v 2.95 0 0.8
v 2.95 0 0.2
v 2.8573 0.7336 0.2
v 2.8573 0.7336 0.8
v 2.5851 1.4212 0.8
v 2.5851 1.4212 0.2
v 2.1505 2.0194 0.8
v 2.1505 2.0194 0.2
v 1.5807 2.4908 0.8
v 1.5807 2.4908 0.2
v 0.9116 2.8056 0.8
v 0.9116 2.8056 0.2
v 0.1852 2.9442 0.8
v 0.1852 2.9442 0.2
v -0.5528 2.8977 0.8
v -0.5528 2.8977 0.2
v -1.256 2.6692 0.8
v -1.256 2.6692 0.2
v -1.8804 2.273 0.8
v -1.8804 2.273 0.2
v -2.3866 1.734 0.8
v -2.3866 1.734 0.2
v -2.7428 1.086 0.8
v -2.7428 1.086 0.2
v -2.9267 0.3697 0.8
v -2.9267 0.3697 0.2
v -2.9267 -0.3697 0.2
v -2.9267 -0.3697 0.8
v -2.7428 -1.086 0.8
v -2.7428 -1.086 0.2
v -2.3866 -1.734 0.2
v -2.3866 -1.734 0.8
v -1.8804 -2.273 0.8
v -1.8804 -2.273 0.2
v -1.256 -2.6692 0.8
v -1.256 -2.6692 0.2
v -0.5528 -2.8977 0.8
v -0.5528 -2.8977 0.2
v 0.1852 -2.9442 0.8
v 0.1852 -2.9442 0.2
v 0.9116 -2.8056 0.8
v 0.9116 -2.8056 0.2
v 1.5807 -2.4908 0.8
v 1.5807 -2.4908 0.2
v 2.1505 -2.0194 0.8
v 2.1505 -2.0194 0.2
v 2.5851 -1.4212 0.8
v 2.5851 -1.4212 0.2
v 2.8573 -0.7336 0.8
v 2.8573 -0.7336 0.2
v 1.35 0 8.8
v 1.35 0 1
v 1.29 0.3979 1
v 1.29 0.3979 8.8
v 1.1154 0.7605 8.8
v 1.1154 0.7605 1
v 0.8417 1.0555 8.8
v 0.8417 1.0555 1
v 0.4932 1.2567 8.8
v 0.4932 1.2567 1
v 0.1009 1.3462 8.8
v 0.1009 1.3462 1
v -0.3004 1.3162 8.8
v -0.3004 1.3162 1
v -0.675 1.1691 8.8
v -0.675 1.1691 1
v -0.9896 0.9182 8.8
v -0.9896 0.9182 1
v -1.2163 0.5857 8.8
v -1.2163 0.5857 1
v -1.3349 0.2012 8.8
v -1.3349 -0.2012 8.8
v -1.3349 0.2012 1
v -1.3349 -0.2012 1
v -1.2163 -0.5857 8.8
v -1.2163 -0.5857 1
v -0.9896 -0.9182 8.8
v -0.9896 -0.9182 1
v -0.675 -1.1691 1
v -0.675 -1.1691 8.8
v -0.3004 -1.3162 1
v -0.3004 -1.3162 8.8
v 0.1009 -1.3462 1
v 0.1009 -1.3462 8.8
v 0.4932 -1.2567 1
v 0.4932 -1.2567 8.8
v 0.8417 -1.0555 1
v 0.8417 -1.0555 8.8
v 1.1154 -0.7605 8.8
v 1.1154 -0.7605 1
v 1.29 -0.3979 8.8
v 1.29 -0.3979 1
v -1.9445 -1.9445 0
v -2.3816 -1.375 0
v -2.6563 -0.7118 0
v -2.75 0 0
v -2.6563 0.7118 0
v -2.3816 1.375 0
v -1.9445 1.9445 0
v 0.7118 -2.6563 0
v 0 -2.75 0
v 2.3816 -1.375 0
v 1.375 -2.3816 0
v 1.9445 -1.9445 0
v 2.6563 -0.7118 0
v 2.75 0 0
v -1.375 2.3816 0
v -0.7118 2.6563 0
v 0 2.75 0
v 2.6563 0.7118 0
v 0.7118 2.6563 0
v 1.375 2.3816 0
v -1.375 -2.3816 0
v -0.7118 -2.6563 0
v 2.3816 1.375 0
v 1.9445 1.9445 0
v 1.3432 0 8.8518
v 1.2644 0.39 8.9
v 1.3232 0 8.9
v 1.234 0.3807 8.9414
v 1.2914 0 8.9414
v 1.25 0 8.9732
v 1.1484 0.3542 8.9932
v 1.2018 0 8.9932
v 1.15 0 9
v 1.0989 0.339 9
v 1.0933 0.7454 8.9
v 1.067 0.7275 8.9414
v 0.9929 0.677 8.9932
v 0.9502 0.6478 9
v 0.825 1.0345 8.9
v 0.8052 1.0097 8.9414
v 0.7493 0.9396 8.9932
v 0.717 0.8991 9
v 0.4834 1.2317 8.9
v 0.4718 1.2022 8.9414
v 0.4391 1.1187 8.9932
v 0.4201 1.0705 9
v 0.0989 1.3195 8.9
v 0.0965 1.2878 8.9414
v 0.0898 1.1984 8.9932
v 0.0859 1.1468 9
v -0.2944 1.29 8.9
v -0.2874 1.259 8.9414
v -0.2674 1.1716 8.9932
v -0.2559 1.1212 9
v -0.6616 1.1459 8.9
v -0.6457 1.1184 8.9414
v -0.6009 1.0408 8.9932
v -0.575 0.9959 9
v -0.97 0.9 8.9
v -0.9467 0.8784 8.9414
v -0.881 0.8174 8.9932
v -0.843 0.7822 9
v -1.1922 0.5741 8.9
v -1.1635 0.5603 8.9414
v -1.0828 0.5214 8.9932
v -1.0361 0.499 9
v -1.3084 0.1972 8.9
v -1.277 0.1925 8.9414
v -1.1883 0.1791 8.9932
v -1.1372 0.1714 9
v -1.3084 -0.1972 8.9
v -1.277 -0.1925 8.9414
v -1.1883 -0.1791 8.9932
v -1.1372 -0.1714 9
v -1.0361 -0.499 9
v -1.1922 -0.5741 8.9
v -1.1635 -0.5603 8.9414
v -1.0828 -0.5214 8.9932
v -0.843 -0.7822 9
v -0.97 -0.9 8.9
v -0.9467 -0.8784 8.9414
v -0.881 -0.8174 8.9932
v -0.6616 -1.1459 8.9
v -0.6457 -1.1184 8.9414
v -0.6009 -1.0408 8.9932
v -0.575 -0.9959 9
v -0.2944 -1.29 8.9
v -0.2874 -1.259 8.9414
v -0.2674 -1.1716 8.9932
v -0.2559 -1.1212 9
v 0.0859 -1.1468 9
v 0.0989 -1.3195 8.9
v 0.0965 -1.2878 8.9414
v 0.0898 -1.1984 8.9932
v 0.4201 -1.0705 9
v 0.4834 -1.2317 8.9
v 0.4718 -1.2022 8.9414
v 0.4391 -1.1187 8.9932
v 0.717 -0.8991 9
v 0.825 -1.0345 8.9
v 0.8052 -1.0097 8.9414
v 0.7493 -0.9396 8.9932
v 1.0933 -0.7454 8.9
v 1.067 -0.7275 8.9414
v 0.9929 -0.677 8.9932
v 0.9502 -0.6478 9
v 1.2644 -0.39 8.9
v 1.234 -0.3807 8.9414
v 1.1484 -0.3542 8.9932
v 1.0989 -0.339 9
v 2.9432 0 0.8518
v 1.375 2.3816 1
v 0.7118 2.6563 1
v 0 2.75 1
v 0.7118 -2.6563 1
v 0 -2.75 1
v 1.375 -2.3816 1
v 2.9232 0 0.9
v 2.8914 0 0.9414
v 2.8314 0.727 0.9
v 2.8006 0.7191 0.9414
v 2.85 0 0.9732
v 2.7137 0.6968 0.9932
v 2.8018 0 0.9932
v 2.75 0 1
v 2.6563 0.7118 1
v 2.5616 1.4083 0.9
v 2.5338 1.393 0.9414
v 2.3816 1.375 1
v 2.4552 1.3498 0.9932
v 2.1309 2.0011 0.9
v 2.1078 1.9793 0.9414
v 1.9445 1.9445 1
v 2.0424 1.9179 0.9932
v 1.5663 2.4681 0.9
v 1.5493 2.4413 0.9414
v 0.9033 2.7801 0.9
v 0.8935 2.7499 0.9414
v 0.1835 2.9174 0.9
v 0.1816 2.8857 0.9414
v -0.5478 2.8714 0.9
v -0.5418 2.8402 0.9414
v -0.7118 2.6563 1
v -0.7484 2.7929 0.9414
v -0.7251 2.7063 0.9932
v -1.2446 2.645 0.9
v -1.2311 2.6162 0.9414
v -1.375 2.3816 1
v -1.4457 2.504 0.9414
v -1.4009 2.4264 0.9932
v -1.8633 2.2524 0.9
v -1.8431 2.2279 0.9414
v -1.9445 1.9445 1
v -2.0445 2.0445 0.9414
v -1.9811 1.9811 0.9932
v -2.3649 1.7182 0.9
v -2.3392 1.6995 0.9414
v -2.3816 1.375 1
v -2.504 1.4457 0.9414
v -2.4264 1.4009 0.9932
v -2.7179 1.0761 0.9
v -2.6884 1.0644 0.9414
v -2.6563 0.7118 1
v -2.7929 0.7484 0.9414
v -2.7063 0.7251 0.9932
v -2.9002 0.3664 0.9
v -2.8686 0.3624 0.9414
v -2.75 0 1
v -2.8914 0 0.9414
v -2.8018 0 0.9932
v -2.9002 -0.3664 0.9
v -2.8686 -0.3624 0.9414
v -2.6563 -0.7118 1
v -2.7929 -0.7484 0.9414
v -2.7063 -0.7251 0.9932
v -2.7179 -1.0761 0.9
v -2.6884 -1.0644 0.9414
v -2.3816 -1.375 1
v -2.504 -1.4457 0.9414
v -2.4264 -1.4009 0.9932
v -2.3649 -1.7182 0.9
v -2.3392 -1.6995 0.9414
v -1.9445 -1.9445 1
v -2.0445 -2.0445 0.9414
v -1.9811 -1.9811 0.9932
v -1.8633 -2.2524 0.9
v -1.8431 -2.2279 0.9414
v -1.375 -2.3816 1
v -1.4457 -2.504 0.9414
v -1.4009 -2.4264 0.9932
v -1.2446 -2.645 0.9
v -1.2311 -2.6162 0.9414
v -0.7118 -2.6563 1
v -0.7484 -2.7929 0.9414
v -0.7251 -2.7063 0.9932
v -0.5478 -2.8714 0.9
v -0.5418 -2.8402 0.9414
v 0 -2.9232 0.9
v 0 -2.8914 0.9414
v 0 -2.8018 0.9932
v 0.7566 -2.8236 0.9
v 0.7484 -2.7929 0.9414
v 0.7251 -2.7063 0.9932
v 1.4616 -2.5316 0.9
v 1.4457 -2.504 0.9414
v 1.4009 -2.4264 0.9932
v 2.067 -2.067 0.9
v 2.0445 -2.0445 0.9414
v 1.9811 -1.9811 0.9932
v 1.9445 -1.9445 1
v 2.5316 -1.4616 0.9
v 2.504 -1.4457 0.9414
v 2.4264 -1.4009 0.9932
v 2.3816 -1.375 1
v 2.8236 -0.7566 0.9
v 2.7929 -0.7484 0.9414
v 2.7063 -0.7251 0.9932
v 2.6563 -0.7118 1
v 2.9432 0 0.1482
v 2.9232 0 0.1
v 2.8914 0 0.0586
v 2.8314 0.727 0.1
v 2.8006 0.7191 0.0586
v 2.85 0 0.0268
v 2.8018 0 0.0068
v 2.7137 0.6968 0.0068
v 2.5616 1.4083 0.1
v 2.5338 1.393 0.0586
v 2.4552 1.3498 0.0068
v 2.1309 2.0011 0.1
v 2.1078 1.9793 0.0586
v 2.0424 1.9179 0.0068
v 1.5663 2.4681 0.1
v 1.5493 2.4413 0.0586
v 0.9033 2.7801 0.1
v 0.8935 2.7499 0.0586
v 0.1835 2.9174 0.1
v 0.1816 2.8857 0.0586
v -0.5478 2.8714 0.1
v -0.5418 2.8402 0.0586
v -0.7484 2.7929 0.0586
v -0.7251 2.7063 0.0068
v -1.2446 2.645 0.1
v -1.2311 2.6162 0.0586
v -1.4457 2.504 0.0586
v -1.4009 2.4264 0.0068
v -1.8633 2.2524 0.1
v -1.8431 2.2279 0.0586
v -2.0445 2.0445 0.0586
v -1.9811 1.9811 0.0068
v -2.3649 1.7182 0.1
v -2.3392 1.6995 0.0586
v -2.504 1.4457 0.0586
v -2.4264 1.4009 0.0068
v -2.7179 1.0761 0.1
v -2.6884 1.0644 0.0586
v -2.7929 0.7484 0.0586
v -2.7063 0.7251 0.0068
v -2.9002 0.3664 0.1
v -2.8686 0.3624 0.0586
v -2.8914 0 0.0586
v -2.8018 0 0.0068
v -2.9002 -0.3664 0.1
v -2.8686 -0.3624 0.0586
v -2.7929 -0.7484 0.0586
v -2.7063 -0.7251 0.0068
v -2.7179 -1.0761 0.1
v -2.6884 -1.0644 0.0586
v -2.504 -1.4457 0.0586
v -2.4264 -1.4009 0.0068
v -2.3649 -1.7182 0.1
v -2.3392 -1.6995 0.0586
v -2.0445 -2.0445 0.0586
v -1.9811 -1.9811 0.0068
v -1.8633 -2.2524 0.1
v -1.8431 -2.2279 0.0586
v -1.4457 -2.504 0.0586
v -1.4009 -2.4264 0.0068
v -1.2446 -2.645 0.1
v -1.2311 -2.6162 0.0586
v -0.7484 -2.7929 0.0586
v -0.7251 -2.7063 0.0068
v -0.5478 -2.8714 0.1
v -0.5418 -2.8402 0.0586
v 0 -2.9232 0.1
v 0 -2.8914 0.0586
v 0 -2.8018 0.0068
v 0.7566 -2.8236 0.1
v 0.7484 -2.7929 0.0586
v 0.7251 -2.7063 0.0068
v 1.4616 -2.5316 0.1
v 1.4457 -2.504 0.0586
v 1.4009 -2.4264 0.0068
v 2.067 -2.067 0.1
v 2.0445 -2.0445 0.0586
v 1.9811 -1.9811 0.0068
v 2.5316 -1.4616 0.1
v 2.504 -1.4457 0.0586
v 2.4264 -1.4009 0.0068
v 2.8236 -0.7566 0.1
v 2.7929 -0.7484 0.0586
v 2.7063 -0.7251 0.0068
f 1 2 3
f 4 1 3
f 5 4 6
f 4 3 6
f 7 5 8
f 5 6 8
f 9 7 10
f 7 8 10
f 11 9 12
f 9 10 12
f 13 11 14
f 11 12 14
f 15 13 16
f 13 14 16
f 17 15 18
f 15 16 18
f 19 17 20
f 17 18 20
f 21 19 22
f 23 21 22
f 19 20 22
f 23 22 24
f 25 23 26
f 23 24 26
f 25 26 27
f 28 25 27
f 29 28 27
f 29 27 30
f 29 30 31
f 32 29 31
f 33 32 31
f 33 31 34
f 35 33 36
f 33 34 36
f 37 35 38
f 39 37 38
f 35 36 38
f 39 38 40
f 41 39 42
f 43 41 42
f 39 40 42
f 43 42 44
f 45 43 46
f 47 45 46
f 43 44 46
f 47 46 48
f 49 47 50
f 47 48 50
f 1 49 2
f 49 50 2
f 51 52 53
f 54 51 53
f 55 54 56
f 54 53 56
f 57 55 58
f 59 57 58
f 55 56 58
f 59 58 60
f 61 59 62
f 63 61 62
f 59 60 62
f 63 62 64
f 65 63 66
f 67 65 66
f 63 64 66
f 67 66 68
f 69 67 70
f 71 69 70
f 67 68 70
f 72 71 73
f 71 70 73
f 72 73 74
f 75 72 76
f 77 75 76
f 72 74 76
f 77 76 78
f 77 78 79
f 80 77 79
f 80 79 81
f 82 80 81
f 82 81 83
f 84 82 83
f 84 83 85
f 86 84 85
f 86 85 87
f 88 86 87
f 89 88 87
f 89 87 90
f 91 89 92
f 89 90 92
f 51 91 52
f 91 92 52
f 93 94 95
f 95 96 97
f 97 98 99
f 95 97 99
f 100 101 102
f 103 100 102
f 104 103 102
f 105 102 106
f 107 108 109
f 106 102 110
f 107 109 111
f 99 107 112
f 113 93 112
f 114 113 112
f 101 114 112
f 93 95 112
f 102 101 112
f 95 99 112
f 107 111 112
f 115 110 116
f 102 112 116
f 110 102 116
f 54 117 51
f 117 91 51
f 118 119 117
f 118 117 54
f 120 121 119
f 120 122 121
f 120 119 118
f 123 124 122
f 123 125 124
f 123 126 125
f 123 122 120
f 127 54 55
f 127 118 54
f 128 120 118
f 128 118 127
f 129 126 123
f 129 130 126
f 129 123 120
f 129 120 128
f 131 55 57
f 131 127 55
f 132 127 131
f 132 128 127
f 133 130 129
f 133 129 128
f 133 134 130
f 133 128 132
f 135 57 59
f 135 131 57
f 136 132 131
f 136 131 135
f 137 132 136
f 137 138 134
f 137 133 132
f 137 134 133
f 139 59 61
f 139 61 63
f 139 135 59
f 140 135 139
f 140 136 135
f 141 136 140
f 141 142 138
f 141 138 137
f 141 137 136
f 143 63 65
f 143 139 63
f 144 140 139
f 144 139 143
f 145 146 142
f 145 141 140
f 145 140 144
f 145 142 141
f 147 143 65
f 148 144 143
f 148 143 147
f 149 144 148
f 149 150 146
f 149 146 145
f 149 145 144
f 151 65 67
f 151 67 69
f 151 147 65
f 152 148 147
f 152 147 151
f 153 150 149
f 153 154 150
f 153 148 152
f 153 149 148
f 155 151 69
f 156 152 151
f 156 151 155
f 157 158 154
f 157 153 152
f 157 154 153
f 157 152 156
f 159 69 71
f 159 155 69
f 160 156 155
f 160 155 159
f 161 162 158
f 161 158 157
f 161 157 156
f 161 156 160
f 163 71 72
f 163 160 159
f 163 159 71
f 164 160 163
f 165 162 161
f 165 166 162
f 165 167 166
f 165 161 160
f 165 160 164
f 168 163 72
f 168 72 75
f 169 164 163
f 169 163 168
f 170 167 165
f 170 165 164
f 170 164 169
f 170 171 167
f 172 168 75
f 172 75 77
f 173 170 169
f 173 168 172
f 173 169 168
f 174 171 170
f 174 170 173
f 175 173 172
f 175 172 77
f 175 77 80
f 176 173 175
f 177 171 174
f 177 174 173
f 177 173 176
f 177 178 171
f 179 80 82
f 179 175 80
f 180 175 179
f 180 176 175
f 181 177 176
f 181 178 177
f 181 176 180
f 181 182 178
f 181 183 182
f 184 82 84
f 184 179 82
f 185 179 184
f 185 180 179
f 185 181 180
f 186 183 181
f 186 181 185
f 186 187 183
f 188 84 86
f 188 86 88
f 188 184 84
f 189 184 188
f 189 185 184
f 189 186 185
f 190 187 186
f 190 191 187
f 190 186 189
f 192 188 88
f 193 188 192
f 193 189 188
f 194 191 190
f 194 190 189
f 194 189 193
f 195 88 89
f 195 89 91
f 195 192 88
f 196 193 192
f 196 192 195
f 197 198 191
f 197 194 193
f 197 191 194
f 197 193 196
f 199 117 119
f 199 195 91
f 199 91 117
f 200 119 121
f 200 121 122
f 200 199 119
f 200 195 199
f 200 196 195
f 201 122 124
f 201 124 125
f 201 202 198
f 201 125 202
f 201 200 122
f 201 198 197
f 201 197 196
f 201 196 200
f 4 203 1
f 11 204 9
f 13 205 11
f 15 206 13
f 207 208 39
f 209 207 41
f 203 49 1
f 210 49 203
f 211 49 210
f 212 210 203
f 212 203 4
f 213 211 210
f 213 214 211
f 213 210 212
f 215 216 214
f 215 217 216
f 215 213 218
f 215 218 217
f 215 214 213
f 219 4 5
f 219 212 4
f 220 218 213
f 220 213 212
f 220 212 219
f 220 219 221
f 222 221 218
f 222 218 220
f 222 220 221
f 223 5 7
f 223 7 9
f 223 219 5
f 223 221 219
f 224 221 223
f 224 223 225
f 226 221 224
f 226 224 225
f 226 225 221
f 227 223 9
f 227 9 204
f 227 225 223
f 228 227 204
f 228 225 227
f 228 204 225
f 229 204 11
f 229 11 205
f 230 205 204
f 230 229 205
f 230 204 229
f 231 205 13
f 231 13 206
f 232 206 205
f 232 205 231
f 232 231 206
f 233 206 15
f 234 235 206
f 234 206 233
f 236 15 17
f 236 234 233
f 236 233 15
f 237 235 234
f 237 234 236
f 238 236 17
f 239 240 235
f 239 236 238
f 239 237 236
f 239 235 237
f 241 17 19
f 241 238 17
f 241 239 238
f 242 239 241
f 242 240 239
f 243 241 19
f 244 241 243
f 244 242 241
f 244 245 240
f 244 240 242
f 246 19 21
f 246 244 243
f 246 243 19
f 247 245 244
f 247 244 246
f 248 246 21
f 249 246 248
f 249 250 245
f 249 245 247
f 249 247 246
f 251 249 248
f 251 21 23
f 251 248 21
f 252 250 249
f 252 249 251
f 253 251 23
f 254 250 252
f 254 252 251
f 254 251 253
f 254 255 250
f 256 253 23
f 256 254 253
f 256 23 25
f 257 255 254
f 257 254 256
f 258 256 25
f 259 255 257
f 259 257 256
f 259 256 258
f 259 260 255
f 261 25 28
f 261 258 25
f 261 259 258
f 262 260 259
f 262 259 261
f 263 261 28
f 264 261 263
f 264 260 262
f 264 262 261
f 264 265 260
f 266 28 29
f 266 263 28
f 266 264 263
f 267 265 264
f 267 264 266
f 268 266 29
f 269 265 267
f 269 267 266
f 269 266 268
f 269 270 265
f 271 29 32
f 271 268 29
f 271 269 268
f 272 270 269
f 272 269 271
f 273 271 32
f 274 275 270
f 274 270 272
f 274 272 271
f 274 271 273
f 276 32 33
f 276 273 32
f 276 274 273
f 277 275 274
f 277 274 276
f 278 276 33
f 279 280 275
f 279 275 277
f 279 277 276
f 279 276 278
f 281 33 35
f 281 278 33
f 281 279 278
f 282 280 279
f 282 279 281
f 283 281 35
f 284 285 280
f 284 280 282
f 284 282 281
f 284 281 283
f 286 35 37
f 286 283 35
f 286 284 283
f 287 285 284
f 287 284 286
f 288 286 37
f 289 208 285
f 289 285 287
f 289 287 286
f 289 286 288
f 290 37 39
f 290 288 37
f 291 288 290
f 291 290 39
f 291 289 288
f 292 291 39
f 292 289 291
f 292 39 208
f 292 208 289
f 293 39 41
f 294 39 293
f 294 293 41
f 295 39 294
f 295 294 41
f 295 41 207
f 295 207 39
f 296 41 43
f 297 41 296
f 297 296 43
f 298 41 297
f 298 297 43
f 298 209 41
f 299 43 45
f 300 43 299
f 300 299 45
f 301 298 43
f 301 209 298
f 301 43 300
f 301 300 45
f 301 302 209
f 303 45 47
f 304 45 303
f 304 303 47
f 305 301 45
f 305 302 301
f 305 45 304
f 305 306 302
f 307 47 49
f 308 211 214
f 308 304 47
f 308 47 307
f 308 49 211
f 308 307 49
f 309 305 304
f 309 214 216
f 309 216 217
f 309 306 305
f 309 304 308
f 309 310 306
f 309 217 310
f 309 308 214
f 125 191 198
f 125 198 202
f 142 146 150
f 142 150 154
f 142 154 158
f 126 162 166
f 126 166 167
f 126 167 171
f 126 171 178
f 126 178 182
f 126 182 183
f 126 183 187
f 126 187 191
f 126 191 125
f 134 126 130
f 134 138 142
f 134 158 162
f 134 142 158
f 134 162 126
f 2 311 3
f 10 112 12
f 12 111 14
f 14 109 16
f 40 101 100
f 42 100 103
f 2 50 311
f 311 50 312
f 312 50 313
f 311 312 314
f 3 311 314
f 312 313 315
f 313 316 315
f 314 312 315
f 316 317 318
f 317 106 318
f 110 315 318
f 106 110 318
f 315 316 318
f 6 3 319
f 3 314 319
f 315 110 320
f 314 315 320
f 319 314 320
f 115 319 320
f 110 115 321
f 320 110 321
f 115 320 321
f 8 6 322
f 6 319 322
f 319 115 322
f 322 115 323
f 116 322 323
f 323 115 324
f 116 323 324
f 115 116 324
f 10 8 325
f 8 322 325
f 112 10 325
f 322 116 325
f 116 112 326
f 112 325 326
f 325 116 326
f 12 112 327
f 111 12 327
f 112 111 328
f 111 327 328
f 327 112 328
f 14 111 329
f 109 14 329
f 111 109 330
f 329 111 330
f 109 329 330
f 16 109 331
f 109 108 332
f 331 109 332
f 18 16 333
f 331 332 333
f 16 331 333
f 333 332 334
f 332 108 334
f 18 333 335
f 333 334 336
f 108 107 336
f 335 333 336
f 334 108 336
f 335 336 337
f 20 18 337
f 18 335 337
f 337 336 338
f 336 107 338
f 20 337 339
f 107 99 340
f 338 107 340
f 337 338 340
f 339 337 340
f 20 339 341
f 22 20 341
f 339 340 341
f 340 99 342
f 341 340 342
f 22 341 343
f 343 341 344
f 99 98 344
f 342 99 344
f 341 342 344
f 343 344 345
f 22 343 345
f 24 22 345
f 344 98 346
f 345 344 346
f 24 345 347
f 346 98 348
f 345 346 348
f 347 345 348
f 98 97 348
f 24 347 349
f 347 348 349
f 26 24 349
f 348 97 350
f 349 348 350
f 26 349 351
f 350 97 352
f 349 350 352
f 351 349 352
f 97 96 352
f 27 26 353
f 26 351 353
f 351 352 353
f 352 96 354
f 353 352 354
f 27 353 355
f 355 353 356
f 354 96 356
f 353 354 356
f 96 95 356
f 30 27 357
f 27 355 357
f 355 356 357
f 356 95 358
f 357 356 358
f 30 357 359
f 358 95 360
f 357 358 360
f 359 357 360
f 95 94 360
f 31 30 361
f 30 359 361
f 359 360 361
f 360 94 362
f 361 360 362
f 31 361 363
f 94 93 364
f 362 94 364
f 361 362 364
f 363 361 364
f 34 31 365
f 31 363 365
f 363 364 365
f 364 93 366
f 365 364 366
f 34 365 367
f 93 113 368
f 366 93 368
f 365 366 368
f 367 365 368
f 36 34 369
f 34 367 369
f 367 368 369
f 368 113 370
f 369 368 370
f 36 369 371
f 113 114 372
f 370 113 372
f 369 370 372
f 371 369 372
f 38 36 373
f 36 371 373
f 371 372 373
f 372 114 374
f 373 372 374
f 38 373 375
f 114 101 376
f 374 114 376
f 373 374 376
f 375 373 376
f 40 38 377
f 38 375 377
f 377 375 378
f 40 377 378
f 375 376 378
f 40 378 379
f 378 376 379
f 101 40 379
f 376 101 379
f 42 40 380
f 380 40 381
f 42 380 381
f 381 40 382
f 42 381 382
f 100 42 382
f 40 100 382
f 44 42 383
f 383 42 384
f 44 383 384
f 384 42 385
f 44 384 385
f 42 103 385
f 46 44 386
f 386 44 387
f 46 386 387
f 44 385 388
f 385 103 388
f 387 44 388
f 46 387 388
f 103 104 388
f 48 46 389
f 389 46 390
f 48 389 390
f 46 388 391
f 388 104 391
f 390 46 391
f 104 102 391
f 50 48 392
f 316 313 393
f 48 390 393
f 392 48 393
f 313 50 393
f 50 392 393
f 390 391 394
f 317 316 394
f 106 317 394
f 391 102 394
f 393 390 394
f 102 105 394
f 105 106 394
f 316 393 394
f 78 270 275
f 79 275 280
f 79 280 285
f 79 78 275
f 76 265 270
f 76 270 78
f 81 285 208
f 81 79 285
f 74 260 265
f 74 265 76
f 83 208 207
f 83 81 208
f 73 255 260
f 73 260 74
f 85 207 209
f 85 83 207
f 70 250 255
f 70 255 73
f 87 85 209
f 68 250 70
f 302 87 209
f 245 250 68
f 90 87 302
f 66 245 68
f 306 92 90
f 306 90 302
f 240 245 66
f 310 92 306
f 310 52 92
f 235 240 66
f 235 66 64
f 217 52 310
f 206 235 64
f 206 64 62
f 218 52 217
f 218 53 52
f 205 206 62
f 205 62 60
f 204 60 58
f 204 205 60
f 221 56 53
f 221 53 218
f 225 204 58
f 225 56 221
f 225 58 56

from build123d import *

# Parameters (mm, degrees)
SKETCH1_R           = 2.95
BOSS_EXTRUDE1_DEPTH = 1
SKETCH2_R           = 1.35
BOSS_EXTRUDE2_DEPTH = 8
FILLET1_R           = 0.2


with BuildPart() as part:
    # Sketch1 → Boss-Extrude1 (new body)
    with BuildSketch(Plane.XY):
        Circle(SKETCH1_R)
    extrude(amount=BOSS_EXTRUDE1_DEPTH)

    # Sketch2 → Boss-Extrude2 (add)
    with BuildSketch(Plane.XY.offset(1)):
        Circle(SKETCH2_R)
    extrude(amount=BOSS_EXTRUDE2_DEPTH)

    # Fillet1
    fillet1_edges = [part.edges().sort_by_distance(p)[0] for p in [
        (-2.95, 0, 0),
        (-2.95, 0, 1),
        (-1.35, 0, 9),
    ]]
    fillet(fillet1_edges, radius=FILLET1_R)


solid = part.part
